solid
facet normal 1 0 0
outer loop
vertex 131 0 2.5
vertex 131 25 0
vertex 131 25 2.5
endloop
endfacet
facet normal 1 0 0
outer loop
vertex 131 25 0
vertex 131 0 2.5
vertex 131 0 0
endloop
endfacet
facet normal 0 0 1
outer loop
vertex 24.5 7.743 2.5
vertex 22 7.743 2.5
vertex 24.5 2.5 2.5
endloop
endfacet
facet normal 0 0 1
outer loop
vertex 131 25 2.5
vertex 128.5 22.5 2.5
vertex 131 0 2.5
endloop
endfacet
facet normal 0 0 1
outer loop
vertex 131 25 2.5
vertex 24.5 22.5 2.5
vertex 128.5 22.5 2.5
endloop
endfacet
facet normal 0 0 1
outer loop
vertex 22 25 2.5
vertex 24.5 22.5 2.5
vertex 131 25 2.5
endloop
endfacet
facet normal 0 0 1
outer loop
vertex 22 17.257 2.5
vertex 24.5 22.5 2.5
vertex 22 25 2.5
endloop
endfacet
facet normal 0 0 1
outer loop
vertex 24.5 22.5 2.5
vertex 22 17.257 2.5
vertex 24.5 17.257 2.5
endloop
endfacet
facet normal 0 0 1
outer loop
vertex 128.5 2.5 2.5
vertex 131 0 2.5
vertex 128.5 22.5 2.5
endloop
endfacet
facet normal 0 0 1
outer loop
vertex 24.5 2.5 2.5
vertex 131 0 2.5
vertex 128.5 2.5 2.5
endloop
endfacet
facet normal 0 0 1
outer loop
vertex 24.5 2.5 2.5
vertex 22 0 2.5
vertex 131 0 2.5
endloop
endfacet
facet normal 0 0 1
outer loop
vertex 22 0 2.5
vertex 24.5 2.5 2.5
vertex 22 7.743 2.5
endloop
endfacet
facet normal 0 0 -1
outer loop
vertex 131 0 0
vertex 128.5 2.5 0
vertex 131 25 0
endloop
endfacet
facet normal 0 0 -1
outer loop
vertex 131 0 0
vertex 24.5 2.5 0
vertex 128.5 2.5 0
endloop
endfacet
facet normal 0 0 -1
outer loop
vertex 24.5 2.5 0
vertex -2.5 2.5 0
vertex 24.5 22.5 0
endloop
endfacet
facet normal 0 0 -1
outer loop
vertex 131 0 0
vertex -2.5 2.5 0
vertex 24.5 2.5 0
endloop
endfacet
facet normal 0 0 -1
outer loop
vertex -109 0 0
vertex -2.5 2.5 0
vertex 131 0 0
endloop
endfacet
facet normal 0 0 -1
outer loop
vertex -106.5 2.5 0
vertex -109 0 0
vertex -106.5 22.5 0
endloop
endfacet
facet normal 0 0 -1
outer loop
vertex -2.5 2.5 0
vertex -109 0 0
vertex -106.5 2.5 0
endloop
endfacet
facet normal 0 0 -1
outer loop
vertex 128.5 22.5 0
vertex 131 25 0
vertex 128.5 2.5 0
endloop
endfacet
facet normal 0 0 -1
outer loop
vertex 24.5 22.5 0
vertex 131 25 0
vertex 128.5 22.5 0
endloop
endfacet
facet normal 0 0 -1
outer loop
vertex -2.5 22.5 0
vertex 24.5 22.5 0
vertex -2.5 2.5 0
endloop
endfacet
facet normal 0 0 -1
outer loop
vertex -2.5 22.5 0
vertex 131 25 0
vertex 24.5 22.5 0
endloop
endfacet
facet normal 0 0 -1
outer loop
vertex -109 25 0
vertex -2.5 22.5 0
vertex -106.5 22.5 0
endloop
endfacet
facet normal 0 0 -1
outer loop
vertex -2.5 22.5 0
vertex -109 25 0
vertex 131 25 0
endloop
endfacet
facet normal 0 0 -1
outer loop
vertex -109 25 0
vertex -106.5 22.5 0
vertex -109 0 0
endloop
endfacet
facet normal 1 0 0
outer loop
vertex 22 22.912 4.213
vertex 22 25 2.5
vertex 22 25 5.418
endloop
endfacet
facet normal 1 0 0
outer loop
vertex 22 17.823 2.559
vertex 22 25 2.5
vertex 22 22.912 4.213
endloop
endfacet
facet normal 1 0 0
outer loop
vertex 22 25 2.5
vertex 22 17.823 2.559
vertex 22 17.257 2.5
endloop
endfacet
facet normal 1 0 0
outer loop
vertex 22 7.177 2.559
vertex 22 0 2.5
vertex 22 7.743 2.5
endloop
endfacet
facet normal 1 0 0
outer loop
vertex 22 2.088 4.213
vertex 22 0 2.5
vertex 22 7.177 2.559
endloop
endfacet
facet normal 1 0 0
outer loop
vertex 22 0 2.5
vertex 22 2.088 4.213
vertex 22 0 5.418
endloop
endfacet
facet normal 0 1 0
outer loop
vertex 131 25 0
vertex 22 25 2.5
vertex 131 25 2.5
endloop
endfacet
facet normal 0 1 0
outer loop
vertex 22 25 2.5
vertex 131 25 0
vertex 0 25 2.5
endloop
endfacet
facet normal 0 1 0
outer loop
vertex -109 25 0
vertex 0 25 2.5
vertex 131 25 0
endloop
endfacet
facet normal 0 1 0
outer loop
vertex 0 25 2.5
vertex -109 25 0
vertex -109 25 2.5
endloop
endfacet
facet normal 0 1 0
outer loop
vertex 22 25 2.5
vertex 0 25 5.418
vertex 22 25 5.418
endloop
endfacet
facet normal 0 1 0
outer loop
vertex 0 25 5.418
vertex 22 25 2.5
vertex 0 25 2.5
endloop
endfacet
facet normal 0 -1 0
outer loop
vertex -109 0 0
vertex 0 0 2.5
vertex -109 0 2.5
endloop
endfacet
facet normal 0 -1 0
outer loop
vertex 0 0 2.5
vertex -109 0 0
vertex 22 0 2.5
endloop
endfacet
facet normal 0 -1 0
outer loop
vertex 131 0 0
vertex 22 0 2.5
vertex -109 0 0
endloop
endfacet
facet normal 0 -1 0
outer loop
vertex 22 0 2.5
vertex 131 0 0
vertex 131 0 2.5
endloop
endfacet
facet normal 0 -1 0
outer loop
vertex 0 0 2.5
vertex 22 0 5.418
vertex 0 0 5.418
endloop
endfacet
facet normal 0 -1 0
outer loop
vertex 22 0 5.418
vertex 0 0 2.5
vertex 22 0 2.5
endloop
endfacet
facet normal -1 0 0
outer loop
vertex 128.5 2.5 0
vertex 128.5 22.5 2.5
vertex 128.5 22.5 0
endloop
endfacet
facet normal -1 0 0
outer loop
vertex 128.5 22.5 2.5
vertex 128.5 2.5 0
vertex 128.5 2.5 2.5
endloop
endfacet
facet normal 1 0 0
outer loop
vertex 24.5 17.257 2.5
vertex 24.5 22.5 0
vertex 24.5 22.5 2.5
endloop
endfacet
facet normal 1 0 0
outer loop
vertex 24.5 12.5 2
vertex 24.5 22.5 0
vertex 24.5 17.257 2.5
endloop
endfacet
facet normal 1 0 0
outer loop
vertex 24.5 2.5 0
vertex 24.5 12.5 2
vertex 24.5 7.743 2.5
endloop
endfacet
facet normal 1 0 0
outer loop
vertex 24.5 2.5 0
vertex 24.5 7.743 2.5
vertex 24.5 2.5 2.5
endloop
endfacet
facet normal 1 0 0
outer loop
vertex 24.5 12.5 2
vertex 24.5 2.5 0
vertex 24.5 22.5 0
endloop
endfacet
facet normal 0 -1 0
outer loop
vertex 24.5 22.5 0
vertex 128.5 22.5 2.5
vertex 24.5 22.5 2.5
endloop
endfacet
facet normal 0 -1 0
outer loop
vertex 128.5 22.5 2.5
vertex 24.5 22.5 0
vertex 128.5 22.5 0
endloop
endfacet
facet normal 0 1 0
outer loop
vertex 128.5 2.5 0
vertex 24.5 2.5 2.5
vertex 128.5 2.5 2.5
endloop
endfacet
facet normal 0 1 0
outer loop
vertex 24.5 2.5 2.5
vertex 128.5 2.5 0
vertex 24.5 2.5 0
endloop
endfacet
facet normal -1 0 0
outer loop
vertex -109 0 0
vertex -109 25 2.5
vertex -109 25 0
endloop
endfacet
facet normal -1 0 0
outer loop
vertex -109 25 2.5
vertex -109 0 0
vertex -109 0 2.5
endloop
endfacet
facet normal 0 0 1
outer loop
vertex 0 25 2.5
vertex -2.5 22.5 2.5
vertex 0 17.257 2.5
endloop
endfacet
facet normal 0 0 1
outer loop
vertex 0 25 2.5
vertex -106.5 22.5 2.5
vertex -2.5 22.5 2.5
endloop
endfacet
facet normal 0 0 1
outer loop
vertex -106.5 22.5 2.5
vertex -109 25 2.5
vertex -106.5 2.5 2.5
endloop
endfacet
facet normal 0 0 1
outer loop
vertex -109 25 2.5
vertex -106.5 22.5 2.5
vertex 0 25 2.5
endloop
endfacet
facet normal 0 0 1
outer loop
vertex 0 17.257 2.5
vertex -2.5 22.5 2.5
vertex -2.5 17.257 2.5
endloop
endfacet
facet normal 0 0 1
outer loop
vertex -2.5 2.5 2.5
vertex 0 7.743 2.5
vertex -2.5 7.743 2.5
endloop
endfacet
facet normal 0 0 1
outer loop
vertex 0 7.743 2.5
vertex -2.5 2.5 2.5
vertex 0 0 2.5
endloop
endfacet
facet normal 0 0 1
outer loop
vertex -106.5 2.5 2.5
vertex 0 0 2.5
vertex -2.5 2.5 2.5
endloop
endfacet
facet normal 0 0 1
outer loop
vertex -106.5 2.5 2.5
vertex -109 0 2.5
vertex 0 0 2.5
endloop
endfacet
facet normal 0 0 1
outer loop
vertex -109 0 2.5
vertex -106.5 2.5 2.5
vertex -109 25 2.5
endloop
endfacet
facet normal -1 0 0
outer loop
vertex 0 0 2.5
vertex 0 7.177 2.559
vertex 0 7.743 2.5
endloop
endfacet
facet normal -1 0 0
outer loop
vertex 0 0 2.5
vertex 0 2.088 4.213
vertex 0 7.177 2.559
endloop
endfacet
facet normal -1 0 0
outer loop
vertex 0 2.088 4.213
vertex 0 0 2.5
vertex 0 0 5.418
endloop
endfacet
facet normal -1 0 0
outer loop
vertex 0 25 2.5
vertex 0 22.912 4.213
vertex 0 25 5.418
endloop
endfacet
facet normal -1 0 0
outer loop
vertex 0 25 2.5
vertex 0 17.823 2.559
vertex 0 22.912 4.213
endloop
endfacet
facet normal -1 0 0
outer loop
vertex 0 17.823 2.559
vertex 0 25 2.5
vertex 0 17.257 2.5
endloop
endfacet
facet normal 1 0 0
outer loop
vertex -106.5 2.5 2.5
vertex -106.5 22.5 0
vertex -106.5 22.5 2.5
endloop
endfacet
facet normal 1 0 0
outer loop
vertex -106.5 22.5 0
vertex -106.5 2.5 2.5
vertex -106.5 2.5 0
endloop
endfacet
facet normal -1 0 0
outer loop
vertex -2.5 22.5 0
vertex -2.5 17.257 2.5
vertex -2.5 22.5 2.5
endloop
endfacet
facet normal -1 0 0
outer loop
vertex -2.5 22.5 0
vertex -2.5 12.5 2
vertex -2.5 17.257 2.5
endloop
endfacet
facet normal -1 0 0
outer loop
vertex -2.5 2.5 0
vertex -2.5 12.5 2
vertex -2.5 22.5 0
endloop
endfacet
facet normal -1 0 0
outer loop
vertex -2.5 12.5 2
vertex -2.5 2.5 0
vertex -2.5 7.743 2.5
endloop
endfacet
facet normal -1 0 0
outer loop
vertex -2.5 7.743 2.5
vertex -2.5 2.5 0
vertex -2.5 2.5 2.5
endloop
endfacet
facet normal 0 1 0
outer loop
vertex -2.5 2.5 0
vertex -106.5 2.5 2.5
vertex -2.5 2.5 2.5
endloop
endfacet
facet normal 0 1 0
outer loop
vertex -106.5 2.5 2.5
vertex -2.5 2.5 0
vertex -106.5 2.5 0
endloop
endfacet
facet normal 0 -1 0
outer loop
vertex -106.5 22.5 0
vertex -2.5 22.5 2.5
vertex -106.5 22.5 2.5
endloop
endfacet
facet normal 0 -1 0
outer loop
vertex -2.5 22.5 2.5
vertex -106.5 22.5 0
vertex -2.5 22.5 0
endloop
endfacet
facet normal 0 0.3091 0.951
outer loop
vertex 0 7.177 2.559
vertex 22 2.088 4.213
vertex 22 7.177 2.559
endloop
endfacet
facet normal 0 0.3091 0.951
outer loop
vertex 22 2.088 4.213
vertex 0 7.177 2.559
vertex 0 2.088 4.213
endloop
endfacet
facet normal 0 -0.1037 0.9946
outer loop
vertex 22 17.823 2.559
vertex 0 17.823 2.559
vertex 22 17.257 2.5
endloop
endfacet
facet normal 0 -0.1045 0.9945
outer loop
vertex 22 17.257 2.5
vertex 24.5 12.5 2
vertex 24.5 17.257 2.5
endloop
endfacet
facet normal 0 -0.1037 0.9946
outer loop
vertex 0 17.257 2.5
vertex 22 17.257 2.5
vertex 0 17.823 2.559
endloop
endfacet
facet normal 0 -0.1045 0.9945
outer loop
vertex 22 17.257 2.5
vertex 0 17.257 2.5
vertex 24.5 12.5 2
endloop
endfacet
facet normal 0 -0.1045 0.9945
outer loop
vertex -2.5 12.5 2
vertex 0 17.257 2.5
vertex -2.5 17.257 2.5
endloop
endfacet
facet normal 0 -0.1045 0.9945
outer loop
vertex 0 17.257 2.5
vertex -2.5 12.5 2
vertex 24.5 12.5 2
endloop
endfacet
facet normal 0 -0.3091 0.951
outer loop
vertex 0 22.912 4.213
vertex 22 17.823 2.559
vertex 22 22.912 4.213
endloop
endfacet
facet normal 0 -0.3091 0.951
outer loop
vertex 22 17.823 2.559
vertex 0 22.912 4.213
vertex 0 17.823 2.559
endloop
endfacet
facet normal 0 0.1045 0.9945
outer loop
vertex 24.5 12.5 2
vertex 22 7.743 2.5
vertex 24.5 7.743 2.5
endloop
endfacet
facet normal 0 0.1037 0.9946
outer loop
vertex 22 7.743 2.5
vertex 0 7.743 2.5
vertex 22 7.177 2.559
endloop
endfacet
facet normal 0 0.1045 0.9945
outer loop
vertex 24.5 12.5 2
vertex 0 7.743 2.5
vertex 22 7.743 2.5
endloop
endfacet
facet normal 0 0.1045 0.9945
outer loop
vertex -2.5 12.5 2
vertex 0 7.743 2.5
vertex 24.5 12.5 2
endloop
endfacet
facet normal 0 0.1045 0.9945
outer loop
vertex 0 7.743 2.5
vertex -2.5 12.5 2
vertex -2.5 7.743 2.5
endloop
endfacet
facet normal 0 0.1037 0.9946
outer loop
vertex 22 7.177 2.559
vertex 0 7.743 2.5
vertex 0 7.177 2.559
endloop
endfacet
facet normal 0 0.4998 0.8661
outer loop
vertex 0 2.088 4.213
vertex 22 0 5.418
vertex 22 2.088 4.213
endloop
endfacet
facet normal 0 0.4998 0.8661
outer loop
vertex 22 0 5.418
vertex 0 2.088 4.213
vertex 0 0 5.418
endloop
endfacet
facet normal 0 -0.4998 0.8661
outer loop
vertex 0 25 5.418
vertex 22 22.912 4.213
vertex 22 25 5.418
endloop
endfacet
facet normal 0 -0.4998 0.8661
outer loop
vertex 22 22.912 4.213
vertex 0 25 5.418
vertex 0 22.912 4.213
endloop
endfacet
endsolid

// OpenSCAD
//mainSling
width = 25;
length = 240;
thickness = 2.5;
baseLength = 22;
baseThickness = 6;
//roundCutout
rCut = 1; //1=yes 0=no
rCutDia = 25.6;

//var
//$fn = 90;

//math
slingLength = length/2-baseLength/2;

module sling(slingLength,width,thickness){
  difference() {
    cube([slingLength,width,thickness]);
    translate([thickness,thickness,-1]) {
      cube([slingLength-thickness*2,width-thickness*2,thickness+2]);
    }
  }
}
module base(baseLength,width,baseThickness) {
  cube([baseLength,width,baseThickness]);
}
module rCut(rCutDia,baseLength,baseThickness,width,thickness) {
  translate([baseLength/2,width/2,rCutDia+baseThickness/3]){
    rotate([0,90,0]){
      cylinder(r=rCutDia, h=baseLength+2+thickness*2, center=true);
    }
  }
}
module mainSling(baseLength,width,baseThickness,slingLength,thickness){
  base(baseLength,width,baseThickness);
  translate([baseLength,0,0]){
    sling(slingLength,width,thickness);
  }
  translate([0,width,0]){
    rotate([0,0,180]){
      sling(slingLength,width,thickness);
    }
  }
}


difference(){
  mainSling(baseLength,width,baseThickness,slingLength,thickness);
  if (rCut==1) {
    rCut(rCutDia,baseLength,baseThickness,width,thickness);
  }
}
